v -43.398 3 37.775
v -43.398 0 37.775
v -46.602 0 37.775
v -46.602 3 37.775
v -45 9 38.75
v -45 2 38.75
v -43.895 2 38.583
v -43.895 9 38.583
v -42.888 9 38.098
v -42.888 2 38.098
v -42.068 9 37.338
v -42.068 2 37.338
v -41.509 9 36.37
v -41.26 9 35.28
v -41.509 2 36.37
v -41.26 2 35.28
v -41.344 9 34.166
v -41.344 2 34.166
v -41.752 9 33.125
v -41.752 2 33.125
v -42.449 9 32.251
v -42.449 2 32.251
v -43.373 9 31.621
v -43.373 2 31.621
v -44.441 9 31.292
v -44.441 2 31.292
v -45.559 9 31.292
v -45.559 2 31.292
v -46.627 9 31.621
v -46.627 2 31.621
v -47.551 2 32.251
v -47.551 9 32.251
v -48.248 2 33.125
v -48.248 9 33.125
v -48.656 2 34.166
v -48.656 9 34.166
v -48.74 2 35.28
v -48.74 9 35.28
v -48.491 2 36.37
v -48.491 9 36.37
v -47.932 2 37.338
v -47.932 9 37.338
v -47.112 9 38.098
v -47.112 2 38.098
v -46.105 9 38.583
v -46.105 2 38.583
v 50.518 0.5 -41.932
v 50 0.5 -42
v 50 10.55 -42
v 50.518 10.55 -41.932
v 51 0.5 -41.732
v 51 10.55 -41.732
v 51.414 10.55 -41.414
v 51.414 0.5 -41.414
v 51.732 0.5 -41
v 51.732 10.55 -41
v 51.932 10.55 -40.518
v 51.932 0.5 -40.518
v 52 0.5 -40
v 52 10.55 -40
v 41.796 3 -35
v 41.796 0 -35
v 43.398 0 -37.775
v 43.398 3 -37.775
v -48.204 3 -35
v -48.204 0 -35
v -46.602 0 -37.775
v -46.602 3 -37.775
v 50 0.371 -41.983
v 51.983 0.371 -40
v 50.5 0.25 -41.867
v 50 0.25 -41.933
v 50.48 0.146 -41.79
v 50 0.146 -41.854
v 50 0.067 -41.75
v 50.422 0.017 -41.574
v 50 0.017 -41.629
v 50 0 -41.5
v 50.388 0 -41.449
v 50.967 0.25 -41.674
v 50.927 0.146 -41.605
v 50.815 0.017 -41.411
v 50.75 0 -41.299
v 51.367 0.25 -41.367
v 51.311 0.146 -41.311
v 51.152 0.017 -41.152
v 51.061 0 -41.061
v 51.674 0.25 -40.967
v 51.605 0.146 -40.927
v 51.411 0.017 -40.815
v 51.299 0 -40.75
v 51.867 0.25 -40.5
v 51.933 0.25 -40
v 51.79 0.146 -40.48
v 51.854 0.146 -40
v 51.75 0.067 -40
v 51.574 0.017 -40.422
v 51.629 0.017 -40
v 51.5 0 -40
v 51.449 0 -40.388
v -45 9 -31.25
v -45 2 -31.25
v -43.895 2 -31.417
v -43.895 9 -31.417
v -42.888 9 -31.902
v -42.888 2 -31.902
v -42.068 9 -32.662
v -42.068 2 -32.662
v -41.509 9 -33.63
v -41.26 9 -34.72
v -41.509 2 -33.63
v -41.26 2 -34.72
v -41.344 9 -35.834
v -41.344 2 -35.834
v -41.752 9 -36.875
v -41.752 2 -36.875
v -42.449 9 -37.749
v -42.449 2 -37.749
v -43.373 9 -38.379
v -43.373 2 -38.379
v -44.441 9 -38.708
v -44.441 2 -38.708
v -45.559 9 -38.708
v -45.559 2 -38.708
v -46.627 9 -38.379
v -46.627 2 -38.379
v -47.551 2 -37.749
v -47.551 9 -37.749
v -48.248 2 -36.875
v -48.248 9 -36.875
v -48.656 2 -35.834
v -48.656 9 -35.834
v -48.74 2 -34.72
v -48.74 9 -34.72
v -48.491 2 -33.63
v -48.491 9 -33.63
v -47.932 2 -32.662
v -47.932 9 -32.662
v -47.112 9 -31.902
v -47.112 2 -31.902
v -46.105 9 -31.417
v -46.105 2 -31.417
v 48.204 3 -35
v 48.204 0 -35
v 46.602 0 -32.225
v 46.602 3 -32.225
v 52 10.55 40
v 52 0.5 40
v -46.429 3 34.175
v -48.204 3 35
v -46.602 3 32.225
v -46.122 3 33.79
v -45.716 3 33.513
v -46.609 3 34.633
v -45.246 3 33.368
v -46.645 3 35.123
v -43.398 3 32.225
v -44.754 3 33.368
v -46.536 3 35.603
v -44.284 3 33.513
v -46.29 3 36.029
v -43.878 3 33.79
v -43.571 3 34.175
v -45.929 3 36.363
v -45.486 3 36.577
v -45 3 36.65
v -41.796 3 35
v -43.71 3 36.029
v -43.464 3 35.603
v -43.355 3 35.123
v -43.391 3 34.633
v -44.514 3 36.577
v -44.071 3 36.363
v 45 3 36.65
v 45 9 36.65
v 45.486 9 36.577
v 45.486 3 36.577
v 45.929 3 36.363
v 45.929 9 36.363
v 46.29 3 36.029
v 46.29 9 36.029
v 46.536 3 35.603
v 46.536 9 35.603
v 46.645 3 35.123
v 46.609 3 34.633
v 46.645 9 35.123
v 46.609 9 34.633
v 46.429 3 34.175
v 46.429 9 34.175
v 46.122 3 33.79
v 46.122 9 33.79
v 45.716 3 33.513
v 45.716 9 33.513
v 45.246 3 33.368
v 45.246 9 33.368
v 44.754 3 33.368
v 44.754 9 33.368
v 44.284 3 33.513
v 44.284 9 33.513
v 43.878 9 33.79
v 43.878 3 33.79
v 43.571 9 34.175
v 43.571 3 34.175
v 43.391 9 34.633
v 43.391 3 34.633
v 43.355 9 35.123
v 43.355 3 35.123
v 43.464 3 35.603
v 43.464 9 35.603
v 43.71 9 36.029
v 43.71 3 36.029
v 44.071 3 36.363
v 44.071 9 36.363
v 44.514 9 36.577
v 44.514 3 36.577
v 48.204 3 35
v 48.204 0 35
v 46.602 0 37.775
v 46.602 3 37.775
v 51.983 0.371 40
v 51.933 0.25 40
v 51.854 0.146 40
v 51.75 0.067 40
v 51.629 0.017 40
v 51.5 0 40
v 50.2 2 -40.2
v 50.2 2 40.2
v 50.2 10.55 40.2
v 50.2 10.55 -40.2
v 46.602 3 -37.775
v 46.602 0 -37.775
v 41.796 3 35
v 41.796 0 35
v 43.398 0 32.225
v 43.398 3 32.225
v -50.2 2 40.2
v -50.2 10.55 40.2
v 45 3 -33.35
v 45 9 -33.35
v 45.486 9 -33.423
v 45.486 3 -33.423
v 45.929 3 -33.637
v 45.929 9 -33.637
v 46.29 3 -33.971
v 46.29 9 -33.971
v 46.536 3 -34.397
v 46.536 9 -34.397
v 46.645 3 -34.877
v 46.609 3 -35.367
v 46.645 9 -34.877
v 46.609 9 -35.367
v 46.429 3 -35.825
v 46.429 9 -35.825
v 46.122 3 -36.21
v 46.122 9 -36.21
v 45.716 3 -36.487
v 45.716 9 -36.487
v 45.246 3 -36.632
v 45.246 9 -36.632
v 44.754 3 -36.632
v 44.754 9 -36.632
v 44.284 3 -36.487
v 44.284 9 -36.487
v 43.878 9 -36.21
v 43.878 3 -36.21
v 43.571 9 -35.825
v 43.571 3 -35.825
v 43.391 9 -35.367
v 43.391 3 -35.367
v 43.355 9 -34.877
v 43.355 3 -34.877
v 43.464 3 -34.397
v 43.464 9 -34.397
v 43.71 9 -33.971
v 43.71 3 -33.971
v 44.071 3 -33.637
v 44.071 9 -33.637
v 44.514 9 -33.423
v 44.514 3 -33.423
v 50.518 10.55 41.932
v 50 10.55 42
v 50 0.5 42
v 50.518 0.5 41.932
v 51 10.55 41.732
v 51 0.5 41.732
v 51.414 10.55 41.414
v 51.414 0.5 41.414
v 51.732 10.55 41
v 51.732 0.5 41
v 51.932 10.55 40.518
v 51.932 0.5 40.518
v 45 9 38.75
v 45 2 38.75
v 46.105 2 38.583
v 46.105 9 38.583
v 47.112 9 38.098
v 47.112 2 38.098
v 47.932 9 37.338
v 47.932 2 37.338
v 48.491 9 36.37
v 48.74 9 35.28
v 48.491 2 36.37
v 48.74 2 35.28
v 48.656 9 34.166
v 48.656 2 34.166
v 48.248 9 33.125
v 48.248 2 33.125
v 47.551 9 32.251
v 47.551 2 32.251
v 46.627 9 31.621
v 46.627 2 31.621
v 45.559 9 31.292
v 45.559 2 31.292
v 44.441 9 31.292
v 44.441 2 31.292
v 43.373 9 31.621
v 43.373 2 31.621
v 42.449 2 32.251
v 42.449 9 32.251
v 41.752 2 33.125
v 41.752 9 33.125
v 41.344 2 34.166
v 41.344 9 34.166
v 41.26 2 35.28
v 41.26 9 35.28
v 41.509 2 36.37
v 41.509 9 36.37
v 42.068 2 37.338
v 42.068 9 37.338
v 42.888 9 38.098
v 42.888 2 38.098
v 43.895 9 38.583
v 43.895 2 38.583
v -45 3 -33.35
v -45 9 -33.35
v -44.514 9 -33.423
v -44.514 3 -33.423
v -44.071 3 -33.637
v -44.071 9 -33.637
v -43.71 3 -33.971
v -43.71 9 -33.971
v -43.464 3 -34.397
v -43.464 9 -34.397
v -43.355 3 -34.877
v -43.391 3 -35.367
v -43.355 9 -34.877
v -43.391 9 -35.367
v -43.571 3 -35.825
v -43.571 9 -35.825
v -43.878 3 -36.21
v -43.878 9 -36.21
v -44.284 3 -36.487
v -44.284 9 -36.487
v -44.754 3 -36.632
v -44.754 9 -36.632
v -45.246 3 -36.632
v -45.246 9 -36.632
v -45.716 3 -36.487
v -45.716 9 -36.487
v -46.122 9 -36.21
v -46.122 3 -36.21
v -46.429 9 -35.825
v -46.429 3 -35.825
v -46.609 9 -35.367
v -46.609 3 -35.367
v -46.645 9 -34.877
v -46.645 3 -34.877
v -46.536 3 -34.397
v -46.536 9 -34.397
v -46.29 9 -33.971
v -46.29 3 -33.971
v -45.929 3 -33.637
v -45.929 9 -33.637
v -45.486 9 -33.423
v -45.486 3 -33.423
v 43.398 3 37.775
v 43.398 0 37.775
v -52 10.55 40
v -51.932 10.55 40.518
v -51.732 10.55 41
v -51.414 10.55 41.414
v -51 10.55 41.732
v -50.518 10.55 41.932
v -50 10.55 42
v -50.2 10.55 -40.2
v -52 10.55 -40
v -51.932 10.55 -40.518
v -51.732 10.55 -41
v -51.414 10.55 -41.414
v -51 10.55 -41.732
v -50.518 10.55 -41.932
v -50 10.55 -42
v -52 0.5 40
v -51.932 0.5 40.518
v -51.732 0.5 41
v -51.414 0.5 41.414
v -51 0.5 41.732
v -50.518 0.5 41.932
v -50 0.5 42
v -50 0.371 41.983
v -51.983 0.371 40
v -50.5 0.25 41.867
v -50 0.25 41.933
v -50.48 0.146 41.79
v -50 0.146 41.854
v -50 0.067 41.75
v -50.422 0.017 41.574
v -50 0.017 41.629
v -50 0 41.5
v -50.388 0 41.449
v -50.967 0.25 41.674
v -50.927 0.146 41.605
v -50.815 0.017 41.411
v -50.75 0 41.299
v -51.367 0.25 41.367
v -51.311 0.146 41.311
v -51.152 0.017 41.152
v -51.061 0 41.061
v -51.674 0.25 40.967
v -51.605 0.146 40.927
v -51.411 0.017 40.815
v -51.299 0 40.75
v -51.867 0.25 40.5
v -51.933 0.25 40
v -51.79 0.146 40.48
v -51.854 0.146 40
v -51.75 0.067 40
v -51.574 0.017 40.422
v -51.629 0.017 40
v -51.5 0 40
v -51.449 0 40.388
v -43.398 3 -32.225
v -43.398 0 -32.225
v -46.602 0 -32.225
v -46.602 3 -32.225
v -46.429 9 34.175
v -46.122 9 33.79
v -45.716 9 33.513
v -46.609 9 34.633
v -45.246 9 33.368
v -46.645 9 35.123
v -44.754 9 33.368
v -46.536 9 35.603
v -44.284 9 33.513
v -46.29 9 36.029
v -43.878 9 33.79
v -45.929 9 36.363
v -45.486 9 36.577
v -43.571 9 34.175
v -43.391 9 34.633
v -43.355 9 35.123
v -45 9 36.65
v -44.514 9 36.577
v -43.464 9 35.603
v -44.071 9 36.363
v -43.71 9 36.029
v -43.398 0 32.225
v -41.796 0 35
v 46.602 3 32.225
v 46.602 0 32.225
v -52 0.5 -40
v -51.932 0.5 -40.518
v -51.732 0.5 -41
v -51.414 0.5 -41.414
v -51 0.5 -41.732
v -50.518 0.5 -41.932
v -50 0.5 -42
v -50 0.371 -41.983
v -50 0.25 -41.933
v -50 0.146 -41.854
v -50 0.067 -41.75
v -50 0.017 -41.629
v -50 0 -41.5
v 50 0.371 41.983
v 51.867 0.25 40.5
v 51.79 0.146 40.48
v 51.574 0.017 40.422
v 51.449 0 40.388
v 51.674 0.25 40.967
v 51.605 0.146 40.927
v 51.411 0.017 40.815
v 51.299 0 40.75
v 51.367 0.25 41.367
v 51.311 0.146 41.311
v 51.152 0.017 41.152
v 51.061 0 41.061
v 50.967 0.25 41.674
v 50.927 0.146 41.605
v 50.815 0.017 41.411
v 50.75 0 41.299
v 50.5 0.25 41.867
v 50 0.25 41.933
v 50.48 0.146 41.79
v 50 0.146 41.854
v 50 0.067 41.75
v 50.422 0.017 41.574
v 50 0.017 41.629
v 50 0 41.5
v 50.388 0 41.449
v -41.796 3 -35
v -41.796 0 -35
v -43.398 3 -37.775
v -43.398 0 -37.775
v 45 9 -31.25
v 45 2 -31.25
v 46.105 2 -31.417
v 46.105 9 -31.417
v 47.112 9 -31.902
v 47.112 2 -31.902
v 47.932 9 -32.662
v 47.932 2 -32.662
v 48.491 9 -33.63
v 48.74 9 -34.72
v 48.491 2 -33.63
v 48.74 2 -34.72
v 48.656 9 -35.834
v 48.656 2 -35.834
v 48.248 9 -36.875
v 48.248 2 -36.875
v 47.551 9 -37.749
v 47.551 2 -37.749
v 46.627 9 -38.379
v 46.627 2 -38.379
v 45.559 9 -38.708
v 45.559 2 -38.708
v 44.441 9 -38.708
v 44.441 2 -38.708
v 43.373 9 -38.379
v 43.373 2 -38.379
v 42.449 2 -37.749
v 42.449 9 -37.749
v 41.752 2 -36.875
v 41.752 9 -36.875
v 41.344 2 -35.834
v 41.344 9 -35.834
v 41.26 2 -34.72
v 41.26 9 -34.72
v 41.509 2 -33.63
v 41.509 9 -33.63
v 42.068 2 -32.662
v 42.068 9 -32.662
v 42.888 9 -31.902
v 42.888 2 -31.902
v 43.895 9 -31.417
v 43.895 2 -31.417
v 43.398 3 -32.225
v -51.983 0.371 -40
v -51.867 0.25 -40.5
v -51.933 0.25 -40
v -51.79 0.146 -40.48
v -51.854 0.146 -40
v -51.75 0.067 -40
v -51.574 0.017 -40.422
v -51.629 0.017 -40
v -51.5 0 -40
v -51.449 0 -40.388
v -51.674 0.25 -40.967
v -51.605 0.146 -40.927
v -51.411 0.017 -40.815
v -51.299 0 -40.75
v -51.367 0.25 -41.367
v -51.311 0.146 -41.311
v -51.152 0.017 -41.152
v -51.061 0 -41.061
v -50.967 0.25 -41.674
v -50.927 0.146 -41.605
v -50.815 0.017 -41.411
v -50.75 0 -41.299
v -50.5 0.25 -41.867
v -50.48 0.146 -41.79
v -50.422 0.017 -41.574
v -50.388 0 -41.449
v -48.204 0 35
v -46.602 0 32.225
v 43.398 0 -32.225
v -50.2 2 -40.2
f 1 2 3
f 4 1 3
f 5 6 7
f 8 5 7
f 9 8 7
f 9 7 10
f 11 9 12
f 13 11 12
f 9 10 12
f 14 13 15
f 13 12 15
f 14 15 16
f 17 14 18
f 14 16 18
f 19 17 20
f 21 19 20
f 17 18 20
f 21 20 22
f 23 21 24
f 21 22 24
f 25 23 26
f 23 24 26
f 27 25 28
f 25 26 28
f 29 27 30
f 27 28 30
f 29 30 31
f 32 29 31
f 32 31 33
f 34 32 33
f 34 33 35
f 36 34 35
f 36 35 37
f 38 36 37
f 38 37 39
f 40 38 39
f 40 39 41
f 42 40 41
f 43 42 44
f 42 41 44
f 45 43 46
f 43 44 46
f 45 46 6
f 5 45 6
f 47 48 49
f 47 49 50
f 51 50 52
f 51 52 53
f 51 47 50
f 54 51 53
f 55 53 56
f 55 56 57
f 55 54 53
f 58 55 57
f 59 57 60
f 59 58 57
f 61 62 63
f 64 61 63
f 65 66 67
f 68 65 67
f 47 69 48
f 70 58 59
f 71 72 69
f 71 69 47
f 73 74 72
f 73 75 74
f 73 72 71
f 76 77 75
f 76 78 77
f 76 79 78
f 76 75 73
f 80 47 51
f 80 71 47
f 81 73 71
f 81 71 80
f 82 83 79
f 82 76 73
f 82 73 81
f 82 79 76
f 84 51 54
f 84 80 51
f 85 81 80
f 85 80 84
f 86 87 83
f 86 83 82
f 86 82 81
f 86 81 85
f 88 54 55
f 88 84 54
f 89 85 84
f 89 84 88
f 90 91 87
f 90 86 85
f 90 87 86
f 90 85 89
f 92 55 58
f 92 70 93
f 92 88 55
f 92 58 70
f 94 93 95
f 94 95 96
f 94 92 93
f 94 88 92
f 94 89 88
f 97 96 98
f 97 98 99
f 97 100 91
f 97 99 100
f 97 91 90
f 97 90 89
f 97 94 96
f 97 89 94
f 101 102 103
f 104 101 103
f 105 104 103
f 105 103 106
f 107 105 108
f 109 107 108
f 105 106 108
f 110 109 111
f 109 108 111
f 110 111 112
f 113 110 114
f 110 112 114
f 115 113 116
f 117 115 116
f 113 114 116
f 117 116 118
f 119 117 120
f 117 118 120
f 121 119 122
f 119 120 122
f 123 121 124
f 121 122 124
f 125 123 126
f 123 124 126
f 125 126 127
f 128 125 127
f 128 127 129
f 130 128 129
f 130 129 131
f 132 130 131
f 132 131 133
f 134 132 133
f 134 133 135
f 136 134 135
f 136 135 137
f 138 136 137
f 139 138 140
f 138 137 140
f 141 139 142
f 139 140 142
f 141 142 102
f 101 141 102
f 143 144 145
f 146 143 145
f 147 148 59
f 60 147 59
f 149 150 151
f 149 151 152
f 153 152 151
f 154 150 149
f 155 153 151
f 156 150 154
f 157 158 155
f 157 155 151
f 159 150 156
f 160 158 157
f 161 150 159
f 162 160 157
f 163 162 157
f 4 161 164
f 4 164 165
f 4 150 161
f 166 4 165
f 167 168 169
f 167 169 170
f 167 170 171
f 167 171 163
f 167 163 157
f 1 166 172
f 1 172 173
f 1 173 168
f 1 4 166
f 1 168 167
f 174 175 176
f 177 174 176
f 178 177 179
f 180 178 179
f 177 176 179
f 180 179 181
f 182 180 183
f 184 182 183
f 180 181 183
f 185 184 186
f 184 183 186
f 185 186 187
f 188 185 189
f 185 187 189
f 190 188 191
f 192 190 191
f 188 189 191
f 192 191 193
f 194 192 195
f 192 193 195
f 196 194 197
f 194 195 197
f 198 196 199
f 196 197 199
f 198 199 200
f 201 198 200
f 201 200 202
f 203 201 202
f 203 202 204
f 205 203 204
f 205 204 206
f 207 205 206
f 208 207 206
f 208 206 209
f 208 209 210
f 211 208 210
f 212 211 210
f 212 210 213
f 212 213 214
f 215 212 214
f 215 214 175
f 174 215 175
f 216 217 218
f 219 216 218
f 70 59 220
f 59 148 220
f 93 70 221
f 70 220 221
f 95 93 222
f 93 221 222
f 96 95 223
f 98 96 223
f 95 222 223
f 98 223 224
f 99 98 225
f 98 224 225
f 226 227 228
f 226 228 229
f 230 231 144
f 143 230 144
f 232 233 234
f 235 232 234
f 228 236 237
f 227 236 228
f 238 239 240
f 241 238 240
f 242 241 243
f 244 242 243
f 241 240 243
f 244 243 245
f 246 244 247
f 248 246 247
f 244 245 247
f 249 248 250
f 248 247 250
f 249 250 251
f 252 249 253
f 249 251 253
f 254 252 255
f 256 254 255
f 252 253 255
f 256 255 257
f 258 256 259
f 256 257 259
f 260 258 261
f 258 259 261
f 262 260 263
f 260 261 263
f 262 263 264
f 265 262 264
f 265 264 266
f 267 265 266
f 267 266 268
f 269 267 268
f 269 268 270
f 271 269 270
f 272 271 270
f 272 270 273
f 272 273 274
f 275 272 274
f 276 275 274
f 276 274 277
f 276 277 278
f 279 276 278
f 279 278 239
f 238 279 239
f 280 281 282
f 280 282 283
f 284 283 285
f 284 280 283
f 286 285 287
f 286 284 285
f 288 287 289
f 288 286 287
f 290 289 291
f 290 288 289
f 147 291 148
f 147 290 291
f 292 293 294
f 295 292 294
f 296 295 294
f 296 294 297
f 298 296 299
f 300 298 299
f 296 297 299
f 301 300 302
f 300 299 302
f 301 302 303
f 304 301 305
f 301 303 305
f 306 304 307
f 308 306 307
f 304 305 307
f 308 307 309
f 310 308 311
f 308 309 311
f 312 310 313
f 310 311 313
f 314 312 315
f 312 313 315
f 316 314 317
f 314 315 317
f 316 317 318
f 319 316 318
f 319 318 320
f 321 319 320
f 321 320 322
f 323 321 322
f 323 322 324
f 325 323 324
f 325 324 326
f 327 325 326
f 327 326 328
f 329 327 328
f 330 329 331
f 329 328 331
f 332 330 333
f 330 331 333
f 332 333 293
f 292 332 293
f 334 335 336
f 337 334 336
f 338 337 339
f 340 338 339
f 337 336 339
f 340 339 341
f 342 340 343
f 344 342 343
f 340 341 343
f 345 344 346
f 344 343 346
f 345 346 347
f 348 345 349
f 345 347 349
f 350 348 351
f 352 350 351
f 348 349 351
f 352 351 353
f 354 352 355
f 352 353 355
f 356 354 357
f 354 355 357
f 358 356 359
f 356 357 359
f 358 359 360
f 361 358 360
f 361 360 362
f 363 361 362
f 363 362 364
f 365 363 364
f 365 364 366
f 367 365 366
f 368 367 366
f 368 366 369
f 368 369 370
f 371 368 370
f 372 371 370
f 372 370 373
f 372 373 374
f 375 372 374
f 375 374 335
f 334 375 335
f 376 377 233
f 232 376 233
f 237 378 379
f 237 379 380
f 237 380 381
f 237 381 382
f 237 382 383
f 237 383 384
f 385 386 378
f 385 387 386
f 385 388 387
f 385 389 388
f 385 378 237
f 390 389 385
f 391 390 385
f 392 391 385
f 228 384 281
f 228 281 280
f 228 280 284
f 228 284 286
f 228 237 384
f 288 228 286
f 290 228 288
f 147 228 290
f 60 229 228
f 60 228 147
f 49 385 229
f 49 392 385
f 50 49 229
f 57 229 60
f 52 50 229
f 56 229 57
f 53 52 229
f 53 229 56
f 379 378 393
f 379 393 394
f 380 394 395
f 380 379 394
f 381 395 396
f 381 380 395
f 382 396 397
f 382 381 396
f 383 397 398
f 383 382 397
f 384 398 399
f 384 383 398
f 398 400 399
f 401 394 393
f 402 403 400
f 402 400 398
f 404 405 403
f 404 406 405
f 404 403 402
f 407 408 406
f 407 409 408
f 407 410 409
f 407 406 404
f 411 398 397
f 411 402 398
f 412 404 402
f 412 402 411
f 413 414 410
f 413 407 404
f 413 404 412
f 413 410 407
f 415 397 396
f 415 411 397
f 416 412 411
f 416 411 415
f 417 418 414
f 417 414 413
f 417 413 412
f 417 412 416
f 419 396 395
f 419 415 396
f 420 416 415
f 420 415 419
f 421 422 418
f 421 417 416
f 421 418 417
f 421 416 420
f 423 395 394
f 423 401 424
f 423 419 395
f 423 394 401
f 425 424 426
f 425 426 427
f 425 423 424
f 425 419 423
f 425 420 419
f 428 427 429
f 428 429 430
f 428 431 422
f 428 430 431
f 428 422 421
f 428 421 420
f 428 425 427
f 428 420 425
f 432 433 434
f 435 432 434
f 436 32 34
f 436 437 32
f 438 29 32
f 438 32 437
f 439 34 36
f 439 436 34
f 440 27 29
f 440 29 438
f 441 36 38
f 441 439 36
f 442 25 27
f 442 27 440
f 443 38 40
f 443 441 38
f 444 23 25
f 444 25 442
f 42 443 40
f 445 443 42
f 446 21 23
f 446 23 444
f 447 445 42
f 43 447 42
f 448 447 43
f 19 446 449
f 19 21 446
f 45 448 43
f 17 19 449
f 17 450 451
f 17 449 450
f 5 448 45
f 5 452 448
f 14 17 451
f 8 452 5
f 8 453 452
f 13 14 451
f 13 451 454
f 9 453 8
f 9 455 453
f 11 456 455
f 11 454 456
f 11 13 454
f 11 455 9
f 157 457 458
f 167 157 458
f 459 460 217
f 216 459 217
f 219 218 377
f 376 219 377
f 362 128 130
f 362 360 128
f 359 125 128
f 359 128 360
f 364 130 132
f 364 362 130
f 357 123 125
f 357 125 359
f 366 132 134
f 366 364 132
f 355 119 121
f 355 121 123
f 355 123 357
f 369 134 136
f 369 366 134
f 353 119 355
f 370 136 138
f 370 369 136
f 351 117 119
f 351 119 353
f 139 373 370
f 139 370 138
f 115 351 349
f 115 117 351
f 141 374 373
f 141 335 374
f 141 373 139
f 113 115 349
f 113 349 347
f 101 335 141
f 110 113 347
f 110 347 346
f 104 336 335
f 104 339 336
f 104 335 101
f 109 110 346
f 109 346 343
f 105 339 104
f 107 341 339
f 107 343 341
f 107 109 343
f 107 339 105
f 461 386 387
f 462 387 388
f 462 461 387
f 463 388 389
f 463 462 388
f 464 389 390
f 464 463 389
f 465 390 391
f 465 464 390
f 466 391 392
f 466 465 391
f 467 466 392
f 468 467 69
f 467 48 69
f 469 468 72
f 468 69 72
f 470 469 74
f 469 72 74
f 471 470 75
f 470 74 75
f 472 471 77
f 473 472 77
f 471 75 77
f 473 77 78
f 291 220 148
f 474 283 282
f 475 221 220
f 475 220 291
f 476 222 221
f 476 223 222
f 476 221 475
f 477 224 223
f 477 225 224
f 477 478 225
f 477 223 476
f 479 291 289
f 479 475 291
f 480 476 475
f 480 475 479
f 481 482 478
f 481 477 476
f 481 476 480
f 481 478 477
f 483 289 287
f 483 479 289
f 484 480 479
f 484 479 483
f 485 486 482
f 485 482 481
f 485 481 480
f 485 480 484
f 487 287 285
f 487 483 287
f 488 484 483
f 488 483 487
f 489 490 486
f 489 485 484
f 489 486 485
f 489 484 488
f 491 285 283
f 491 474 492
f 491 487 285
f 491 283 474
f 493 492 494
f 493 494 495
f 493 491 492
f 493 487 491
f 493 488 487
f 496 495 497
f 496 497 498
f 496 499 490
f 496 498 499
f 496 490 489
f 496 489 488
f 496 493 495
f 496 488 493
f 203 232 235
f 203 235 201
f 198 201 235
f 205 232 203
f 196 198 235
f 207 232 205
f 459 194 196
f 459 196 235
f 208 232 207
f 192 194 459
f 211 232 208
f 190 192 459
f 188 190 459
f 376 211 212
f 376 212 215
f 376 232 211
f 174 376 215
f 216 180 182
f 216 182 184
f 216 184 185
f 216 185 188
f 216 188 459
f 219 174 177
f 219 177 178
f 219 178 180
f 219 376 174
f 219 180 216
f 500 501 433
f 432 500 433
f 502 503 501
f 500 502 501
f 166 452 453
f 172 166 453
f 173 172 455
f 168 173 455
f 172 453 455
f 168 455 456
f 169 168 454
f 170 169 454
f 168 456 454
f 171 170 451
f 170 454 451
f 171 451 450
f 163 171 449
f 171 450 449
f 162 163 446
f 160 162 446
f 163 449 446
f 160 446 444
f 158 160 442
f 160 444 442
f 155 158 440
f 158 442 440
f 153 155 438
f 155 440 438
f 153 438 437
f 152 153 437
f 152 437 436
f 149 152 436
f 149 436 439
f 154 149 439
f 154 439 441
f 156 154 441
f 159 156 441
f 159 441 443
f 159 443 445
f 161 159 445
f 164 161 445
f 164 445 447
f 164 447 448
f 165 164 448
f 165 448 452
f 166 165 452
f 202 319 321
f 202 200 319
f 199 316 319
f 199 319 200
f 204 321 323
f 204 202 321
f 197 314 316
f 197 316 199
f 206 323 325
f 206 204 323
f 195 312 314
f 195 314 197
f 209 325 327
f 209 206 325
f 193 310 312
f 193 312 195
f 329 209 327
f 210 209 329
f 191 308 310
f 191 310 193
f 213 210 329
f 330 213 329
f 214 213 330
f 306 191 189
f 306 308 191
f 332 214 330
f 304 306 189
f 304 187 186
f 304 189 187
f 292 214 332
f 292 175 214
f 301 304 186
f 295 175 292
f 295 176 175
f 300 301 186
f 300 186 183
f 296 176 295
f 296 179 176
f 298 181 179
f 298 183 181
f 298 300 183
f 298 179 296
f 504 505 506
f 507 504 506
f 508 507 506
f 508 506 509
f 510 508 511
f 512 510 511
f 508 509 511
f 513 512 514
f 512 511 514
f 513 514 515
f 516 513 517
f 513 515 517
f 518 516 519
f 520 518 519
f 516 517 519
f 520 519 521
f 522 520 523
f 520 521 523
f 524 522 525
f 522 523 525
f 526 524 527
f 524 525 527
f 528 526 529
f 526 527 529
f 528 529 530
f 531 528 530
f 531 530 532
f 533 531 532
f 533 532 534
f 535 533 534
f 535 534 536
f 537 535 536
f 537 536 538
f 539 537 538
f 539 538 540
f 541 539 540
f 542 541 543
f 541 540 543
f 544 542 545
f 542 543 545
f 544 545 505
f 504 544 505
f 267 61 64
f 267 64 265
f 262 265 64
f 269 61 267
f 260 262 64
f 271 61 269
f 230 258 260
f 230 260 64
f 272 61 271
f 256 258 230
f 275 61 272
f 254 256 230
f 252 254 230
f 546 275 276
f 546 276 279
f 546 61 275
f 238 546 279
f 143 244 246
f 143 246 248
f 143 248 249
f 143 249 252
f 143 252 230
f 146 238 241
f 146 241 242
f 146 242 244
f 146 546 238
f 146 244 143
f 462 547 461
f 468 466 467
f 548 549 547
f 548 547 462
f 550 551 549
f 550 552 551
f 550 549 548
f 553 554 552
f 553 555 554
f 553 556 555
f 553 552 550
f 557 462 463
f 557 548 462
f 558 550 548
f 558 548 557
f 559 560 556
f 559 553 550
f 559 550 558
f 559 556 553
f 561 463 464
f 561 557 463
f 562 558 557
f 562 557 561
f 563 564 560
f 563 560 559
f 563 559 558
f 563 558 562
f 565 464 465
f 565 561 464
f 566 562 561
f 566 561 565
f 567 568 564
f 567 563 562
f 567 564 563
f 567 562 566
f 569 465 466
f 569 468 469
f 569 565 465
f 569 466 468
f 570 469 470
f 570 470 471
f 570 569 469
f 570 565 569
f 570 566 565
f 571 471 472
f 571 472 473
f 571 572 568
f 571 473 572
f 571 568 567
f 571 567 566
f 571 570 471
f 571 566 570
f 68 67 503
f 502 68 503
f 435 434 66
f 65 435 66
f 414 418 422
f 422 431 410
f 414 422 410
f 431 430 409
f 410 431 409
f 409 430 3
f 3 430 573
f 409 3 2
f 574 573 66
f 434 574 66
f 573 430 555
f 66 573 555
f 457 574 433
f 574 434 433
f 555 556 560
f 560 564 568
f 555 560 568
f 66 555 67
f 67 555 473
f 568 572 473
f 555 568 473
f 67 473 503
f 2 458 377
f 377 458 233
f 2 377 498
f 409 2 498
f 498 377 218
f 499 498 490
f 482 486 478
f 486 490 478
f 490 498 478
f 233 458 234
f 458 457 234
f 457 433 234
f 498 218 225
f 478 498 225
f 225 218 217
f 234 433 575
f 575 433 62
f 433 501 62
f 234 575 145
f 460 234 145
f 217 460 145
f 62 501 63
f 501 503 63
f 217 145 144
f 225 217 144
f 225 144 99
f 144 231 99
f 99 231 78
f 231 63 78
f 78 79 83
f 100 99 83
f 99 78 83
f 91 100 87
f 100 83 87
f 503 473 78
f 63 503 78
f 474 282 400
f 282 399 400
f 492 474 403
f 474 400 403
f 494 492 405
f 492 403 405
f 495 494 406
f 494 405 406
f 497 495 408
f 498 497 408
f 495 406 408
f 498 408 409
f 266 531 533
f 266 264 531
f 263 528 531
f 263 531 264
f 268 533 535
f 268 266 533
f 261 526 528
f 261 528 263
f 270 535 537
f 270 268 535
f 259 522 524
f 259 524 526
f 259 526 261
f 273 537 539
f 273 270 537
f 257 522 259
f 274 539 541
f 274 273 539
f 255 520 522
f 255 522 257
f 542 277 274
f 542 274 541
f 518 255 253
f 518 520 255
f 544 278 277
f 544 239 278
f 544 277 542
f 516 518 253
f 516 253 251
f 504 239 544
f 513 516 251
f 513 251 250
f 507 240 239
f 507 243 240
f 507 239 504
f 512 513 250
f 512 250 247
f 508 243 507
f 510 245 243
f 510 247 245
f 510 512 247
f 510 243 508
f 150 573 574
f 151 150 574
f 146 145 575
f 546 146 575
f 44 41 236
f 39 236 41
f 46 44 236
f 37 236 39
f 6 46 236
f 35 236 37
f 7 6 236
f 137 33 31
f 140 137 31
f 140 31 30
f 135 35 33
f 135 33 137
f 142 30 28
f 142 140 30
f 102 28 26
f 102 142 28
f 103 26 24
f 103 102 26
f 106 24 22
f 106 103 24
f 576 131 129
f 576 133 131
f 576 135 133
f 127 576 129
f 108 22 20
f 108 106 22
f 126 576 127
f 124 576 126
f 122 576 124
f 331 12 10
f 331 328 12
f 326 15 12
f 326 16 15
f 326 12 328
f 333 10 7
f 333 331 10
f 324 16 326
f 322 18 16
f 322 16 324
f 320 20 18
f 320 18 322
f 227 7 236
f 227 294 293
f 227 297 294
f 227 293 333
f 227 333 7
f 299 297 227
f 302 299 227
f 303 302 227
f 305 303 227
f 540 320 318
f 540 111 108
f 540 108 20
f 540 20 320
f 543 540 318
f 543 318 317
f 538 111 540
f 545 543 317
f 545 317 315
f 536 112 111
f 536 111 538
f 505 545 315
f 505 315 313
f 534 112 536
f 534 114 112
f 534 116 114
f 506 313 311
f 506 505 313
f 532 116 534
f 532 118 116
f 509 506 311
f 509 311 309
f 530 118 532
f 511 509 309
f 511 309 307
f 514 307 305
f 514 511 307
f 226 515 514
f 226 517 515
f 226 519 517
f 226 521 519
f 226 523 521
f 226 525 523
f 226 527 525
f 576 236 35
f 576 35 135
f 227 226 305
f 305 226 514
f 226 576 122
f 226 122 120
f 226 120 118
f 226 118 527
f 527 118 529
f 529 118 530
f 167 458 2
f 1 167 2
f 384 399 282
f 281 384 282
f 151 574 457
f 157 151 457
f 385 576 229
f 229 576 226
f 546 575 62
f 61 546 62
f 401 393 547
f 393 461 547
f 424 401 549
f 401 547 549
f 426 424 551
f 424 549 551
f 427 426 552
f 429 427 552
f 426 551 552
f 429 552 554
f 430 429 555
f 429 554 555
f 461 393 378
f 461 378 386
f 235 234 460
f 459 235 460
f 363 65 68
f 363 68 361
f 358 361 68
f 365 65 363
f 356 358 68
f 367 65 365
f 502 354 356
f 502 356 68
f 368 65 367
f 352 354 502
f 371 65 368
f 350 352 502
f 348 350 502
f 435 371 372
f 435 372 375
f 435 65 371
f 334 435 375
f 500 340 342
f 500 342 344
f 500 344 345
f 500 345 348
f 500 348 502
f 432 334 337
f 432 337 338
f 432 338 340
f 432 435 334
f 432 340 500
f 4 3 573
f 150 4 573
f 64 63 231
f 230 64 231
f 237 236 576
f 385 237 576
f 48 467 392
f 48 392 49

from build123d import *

# Parameters (mm, degrees)
ESQUISSE1_W             = 104
ESQUISSE1_H             = 84
BOSS_EXTRU_1_DEPTH      = 2
ESQUISSE2_R             = 3.75
BOSS_EXTRU_2_DEPTH      = 7
ESQUISSE3_W             = 104
ESQUISSE3_H             = 84
ESQUISSE3_W_2           = 100.4
ESQUISSE3_H_2           = 80.4
BOSS_EXTRU_3_DEPTH      = 8.55
ESQUISSE4_R             = 1.65
ENL_V_MAT_EXTRU_1_DEPTH = 68.446274916
ENL_V_MAT_EXTRU_2_DEPTH = 3
CONG_1_R                = 2
CONG_2_R                = 0.5


with BuildPart() as part:
    # Esquisse1 → Boss.-Extru.1 (new body)
    with BuildSketch(Plane(origin=(0, 0, 0), x_dir=(1, 0, 0), z_dir=(0, 1, 0))):
        Rectangle(ESQUISSE1_W, ESQUISSE1_H)
    extrude(amount=BOSS_EXTRU_1_DEPTH)

    # Esquisse2 → Boss.-Extru.2 (add)
    with BuildSketch(Plane(origin=(0, 2, 0), x_dir=(1, 0, 0), z_dir=(0, 1, 0))):
        with Locations(Location((-45, 35, 0), (0, 0, 270))):
            Circle(ESQUISSE2_R)
        with Locations(Location((45, 35, 0), (0, 0, 270))):
            Circle(ESQUISSE2_R)
        with Locations(Location((45, -35, 0), (0, 0, 270))):
            Circle(ESQUISSE2_R)
        with Locations(Location((-45, -35, 0), (0, 0, 270))):
            Circle(ESQUISSE2_R)
    extrude(amount=BOSS_EXTRU_2_DEPTH)

    # Esquisse3 → Boss.-Extru.3 (add)
    with BuildSketch(Plane(origin=(0, 2, 0), x_dir=(1, 0, 0), z_dir=(0, 1, 0))):
        Rectangle(ESQUISSE3_W, ESQUISSE3_H)
        Rectangle(ESQUISSE3_W_2, ESQUISSE3_H_2, mode=Mode.SUBTRACT)
    extrude(amount=BOSS_EXTRU_3_DEPTH)

    # Esquisse4 → Enlèv. mat.-Extru.1 (cut, through all)
    with BuildSketch(Plane(origin=(0, 9, 0), x_dir=(1, 0, 0), z_dir=(0, 1, 0))):
        with Locations(Location((-45, 35, 0), (0, 0, 270))):
            Circle(ESQUISSE4_R)
        with Locations(Location((45, 35, 0), (0, 0, 270))):
            Circle(ESQUISSE4_R)
        with Locations(Location((45, -35, 0), (0, 0, 270))):
            Circle(ESQUISSE4_R)
        with Locations(Location((-45, -35, 0), (0, 0, 270))):
            Circle(ESQUISSE4_R)
    extrude(amount=-ENL_V_MAT_EXTRU_1_DEPTH, mode=Mode.SUBTRACT)

    # Esquisse5 → Enlèv. mat.-Extru.2 (cut)
    with BuildSketch(Plane.XZ):
        Polygon((-43.397853003, 32.225), (-41.795706006, 35), (-43.397853003, 37.775), (-46.602146997, 37.775), (-48.204293994, 35), (-46.602146997, 32.225), align=None)
        Polygon((43.397853003, 32.225), (46.602146997, 32.225), (48.204293994, 35), (46.602146997, 37.775), (43.397853003, 37.775), (41.795706006, 35), align=None)
        Polygon((43.397853003, -32.225), (41.795706006, -35), (43.397853003, -37.775), (46.602146997, -37.775), (48.204293994, -35), (46.602146997, -32.225), align=None)
        Polygon((-46.602146997, -32.225), (-48.204293994, -35), (-46.602146997, -37.775), (-43.397853003, -37.775), (-41.795706006, -35), (-43.397853003, -32.225), align=None)
    extrude(amount=-ENL_V_MAT_EXTRU_2_DEPTH, mode=Mode.SUBTRACT)

    # Congé1
    cong_1_edges = [part.edges().sort_by_distance(p)[0] for p in [
        (-52, 5.275, -42),
        (52, 5.275, -42),
        (52, 5.275, 42),
        (-52, 5.275, 42),
    ]]
    fillet(cong_1_edges, radius=CONG_1_R)

    # Congé2
    cong_2_edges = [part.edges().sort_by_distance(p)[0] for p in [
        (-52, 0, 0),
        (0, 0, -42),
        (52, 0, 0),
        (0, 0, 42),
        (51.414213562, 0, 41.414213562),
        (51.414213562, 0, -41.414213562),
        (-51.414213562, 0, 41.414213562),
        (-51.414213562, 0, -41.414213562),
    ]]
    fillet(cong_2_edges, radius=CONG_2_R)


solid = part.part
